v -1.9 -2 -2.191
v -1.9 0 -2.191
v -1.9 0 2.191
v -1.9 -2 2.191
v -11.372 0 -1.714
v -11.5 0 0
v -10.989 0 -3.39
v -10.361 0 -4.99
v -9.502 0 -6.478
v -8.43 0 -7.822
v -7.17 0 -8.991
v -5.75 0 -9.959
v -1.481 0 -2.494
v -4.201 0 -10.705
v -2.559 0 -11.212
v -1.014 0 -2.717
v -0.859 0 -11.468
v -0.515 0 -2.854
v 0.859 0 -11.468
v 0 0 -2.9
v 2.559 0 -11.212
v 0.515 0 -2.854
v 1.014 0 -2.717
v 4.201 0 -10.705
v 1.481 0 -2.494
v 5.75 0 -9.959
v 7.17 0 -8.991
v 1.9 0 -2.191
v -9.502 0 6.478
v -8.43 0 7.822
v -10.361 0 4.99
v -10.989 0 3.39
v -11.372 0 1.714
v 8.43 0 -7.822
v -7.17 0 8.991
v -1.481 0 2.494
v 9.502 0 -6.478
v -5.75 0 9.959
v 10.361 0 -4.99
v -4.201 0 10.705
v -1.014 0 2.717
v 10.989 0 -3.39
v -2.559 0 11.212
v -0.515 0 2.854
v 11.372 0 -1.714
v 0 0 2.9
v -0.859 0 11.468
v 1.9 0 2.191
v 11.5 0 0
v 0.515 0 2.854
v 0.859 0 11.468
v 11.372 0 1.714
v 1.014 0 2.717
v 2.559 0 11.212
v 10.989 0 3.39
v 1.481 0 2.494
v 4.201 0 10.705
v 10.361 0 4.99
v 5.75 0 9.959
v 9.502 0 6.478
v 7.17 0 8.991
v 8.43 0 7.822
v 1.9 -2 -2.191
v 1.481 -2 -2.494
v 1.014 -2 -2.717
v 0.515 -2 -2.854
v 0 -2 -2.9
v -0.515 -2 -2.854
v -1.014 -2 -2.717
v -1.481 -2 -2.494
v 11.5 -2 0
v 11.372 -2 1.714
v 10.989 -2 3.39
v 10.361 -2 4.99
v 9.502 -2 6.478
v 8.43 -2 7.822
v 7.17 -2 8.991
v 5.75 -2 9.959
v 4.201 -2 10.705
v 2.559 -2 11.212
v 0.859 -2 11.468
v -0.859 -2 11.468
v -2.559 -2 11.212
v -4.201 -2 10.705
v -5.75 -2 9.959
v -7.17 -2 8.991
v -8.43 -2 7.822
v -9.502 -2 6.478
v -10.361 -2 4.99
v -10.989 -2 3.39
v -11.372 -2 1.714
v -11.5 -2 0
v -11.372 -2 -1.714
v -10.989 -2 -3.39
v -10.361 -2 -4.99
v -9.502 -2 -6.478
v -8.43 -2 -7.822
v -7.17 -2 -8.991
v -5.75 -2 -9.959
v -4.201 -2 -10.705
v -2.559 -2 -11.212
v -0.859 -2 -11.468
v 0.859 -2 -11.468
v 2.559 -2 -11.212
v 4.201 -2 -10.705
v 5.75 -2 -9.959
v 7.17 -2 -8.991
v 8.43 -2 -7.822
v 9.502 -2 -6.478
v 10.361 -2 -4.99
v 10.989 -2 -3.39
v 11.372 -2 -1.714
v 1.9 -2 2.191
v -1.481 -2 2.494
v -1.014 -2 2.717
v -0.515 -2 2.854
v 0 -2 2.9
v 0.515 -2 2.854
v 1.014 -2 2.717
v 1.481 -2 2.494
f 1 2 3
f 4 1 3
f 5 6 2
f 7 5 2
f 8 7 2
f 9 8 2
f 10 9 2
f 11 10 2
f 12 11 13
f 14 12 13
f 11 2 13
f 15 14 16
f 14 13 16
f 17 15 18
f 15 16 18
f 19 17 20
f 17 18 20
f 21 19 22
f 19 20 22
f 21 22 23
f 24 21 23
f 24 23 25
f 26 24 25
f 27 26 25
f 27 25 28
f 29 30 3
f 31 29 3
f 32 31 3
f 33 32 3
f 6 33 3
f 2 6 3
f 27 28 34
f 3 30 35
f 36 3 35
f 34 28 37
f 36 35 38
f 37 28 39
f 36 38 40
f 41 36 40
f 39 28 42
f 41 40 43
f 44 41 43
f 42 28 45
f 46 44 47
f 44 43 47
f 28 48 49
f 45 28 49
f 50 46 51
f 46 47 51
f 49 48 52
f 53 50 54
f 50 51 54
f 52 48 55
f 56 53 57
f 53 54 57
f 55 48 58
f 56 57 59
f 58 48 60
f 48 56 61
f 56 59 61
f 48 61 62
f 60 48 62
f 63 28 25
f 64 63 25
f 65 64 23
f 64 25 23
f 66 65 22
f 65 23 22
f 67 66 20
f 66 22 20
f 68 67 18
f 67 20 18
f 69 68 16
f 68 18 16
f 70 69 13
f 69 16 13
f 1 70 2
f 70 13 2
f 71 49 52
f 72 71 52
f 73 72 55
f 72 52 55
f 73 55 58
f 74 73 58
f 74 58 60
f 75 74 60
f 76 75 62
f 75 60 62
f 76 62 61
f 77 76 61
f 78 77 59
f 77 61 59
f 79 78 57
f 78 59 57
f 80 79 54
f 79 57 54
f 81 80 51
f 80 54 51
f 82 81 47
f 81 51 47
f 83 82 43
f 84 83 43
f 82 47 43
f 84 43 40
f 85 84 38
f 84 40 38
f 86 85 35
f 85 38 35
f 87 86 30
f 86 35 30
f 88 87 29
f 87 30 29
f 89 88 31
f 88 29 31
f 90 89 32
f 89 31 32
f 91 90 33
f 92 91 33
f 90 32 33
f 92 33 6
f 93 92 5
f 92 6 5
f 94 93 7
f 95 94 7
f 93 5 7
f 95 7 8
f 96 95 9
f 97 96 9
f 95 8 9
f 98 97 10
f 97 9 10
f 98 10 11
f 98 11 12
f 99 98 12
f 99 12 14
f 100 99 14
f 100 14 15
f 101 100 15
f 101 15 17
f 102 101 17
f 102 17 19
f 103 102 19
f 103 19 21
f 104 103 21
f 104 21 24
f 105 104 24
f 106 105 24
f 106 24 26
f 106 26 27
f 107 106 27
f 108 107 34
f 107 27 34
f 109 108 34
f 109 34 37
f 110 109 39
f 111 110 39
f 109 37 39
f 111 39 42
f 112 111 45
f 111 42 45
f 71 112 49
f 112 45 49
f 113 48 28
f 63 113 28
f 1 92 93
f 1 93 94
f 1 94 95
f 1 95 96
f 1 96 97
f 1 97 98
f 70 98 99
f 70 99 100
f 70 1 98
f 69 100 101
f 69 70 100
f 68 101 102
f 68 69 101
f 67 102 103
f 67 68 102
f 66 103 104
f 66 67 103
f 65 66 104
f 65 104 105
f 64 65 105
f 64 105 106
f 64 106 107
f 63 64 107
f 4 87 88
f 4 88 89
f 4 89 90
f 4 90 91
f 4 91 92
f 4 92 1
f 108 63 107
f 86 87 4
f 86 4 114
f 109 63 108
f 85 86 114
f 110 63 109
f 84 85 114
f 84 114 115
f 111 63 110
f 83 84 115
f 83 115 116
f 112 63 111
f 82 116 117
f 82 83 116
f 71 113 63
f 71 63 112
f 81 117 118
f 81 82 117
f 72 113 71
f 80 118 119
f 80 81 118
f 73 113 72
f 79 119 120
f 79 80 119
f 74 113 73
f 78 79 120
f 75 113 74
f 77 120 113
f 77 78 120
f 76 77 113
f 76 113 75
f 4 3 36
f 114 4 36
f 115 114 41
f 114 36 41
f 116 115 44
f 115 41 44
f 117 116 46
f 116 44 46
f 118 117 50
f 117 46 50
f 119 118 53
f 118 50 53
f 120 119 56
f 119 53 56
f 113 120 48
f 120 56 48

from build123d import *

# Parameters (mm, degrees)
F1_DEPTH = 2
F0_R     = 11.5
F2_DEPTH = 2


# Not quite as in the source:
# - a feature names something its author has since deleted; it is built from what else it names


with BuildPart() as f1:
    # F0 (on Front) → F1 (new body)
    with BuildSketch(Plane.XZ):
        with BuildLine():
            Line((-1.9, -2.19089023), (-1.9, 2.19089023))
            ThreePointArc((-1.9, 2.19089023), (-2.9, 0), (-1.9, -2.19089023))
        make_face()
    extrude(amount=F1_DEPTH)



with BuildPart() as f1b:
    # F0 (on Front) → F1, piece 2 (new body)
    with BuildSketch(Plane.XZ):
        with BuildLine():
            ThreePointArc((1.9, -2.19089023), (2.6381811917, -1.2041594579), (2.9, 0))
            ThreePointArc((2.9, 0), (2.6381811917, 1.2041594579), (1.9, 2.19089023))
            Line((1.9, 2.19089023), (1.9, -2.19089023))
        make_face()
    extrude(amount=F1_DEPTH)


with BuildPart() as f1_1:
    add(f1.part)

    add(f1b.part)  # F2 merges F1b
    # F0 (on Front) → F2 (join)
    with BuildSketch(Plane.XZ):
        Circle(F0_R)
        with BuildLine():
            ThreePointArc((1.9, 2.19089023), (2.6381811917, 1.2041594579), (2.9, 0))
            ThreePointArc((2.9, 0), (2.6381811917, -1.2041594579), (1.9, -2.19089023))
            ThreePointArc((1.9, -2.19089023), (0, -2.9), (-1.9, -2.19089023))
            ThreePointArc((-1.9, -2.19089023), (-2.9, 0), (-1.9, 2.19089023))
            ThreePointArc((-1.9, 2.19089023), (0, 2.9), (1.9, 2.19089023))
        make_face(mode=Mode.SUBTRACT)
    extrude(amount=F2_DEPTH)


solid = f1_1.part
